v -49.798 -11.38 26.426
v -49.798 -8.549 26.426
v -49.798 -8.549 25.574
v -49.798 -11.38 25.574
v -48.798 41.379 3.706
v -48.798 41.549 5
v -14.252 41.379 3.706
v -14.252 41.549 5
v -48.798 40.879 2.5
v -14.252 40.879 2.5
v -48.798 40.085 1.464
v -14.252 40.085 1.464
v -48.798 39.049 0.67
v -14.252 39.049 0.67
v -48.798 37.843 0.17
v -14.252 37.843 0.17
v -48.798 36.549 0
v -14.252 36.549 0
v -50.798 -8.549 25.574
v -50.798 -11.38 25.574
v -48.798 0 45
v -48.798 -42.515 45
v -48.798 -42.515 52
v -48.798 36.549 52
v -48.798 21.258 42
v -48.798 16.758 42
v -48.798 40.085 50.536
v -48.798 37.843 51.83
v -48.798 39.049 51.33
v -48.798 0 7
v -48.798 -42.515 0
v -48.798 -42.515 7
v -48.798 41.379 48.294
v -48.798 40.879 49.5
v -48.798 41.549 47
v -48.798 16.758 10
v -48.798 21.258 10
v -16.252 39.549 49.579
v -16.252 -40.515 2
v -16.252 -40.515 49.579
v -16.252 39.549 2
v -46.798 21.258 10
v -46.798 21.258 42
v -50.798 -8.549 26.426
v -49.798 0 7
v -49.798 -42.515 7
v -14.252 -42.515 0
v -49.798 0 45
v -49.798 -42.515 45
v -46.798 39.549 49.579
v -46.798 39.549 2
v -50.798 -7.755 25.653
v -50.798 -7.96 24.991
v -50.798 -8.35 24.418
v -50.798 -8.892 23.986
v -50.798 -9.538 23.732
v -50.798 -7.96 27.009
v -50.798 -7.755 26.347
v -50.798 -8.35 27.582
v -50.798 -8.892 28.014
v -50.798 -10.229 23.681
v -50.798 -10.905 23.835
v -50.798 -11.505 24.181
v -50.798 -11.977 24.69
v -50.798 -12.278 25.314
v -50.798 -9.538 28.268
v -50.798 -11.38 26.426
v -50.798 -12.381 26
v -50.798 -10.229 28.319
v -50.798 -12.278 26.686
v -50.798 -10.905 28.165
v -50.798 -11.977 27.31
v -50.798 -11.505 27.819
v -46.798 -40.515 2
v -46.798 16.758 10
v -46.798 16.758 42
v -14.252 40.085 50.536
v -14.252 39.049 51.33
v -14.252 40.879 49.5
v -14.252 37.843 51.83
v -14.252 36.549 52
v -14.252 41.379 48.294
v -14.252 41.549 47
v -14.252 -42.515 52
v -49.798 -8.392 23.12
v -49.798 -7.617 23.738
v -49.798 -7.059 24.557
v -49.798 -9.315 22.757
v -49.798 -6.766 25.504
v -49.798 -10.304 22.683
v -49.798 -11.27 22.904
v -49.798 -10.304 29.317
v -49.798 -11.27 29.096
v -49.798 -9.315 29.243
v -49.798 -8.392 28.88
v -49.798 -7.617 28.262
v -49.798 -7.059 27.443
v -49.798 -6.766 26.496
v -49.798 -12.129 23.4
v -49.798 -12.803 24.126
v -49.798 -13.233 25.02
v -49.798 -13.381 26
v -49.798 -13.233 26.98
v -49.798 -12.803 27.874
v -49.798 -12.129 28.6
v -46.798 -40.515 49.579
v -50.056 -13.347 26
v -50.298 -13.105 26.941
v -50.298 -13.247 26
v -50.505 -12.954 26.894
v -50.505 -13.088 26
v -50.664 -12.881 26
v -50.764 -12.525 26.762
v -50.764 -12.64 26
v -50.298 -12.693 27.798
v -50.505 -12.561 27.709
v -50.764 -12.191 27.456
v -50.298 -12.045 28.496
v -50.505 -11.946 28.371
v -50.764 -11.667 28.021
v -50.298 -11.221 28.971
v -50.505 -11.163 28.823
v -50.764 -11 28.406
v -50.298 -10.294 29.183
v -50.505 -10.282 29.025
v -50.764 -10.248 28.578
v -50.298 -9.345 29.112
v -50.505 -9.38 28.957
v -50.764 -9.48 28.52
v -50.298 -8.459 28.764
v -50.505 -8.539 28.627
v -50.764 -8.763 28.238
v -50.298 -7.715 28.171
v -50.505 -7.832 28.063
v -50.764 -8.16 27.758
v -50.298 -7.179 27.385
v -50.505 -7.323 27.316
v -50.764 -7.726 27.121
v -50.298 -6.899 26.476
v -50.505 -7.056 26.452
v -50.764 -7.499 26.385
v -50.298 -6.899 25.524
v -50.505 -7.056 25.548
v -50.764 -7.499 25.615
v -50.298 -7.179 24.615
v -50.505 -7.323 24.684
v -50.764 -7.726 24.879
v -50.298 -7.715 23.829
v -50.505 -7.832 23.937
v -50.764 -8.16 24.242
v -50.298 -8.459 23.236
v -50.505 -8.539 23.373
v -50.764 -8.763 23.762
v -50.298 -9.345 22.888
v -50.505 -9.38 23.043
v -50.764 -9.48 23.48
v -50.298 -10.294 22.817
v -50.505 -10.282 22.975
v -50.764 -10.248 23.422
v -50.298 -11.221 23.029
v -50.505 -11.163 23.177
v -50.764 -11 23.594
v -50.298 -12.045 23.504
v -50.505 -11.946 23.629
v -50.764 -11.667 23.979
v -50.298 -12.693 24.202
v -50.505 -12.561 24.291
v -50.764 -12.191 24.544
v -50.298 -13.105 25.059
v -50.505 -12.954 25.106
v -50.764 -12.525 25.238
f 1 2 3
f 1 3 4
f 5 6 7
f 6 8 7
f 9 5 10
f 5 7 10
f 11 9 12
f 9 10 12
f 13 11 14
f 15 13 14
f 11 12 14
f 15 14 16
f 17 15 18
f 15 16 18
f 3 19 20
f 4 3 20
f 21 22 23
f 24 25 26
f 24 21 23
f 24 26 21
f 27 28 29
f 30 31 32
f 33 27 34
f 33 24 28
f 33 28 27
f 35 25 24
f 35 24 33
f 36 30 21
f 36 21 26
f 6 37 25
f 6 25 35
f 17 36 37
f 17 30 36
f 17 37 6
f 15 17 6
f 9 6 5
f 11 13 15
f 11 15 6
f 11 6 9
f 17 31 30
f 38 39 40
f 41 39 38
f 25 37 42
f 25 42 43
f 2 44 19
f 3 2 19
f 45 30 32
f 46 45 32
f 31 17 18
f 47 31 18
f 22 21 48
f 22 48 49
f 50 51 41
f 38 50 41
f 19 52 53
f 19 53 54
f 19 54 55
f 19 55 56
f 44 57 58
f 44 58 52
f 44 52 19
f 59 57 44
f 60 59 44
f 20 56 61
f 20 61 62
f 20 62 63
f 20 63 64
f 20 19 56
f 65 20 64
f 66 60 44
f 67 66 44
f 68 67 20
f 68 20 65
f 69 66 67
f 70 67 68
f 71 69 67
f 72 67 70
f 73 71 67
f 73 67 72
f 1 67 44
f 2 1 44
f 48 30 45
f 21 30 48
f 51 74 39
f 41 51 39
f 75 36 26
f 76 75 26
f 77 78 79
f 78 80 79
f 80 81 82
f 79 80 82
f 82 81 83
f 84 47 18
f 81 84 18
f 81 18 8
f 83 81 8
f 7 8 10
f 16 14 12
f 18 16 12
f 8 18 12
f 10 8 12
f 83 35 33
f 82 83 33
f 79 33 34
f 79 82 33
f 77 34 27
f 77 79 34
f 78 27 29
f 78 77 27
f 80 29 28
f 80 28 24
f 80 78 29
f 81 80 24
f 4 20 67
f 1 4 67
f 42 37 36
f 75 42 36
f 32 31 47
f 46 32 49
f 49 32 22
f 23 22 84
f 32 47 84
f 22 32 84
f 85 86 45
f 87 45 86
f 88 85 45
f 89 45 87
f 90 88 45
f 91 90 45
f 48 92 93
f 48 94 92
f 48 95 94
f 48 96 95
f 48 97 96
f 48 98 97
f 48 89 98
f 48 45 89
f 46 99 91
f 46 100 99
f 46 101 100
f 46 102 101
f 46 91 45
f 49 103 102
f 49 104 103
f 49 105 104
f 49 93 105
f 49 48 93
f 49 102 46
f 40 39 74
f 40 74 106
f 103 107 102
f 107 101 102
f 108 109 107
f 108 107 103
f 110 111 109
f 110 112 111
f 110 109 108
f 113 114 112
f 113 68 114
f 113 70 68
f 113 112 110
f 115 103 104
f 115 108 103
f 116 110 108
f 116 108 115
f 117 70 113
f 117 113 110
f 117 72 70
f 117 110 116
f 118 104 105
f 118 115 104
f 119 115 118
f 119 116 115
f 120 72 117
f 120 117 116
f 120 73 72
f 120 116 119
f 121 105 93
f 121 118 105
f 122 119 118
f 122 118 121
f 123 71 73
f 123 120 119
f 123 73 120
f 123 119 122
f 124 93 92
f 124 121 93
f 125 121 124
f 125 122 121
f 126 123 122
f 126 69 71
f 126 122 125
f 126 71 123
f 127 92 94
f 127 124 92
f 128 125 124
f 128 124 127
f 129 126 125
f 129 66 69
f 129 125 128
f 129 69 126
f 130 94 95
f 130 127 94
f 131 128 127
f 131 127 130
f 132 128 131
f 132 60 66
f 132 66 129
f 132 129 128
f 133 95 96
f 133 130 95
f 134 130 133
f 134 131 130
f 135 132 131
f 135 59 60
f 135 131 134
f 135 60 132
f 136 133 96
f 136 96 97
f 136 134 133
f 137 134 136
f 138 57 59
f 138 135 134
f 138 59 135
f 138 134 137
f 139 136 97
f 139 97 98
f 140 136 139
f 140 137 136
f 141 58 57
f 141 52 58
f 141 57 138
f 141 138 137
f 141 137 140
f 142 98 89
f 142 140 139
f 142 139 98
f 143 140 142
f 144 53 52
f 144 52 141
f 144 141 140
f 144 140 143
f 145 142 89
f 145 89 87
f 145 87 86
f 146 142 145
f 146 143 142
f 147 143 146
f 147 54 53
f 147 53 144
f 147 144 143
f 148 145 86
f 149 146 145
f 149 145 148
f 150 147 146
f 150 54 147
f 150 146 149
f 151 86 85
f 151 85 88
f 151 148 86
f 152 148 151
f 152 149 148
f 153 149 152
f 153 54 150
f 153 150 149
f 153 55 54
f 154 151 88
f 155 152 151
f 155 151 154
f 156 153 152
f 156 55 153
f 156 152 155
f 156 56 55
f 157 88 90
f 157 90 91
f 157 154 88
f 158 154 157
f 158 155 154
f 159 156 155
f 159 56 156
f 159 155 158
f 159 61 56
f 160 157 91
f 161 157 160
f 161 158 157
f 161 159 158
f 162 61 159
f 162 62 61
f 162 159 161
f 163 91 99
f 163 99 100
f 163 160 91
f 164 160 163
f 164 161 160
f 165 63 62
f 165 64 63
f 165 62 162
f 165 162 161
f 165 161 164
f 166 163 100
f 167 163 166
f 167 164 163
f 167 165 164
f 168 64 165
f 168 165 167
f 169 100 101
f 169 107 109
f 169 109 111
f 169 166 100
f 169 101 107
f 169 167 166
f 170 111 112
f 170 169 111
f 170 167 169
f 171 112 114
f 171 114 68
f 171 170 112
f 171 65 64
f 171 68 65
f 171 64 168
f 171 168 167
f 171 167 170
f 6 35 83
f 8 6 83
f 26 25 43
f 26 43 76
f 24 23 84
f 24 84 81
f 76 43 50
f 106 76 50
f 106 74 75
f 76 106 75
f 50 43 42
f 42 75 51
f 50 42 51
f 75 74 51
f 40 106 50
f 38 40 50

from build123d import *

# Parameters (mm, degrees)
F0_W      = 34.5459179953
F0_H      = 84.0644203126
F1_DEPTH  = 2
F2_W      = 2
F2_H      = 84.0644203126
F3_DEPTH  = 50
F4_W      = 2
F4_H      = 84.0644203126
F5_DEPTH  = 50
F6_W      = 84.0644203126
F6_H      = 2.4206031561
F7_DEPTH  = 32.2
F8_W      = 30.5459179953
F8_H      = 2
F9_DEPTH  = 47.6
F10_R     = 5
F11_R     = 5
F12_W     = 2
F12_H     = 47.5793968439
F13_DEPTH = 31.3
F14_W     = 4.5
F14_H     = 32
F15_DEPTH = 25
F16_W     = 42.5153374672
F16_H     = 38
F17_DEPTH = 1
F18_R     = 3.3259647968
F19_DEPTH = 1
F20_R     = 0.99999
F22_DEPTH = 1


# Not quite as in the source:
# - a fillet or chamfer is up to 0.001 mm smaller than in the source, because OpenCascade refuses the exact size


with BuildPart() as f1:
    # F0 (on Top) → F1 (new body)
    with BuildSketch(Plane.XY):
        with Locations((-31.5246856771, -0.4831273109)):
            Rectangle(F0_W, F0_H)
    extrude(amount=F1_DEPTH)

    # F2 (on face) → F3 (join)
    with BuildSketch(Plane.XY.offset(2)):
        with Locations((-15.2517266795, -0.4831273109)):
            Rectangle(F2_W, F2_H)
    extrude(amount=F3_DEPTH)

    # F4 (on face) → F5 (join)
    with BuildSketch(Plane.XY.offset(2)):
        with Locations((-47.7976446748, -0.4831273109)):
            Rectangle(F4_W, F4_H)
    extrude(amount=F5_DEPTH)

    # F6 (on face) → F7 (join)
    with BuildSketch(Plane.YZ.offset(-46.7976446748)):
        with Locations((-0.4831273109, 50.789698422)):
            Rectangle(F6_W, F6_H)
    extrude(amount=F7_DEPTH)

    # F8 (on face) → F9 (join)
    with BuildSketch(Plane.XY.offset(2)):
        with Locations((-31.5246856771, 40.5490828454)):
            Rectangle(F8_W, F8_H)
    extrude(amount=F9_DEPTH)

    # F10
    f10_edges = [f1.edges().sort_by_distance(p)[0] for p in [
        (-31.524686, 41.549083, 52),
    ]]
    fillet(f10_edges, radius=F10_R)

    # F11
    f11_edges = [f1.edges().sort_by_distance(p)[0] for p in [
        (-31.524686, 41.549083, 0),
    ]]
    fillet(f11_edges, radius=F11_R)

    # F12 (on face) → F13 (join)
    with BuildSketch(Plane(origin=(-16.2517266795, 0, 0), x_dir=(0, -1, 0), z_dir=(-1, 0, 0))):
        with Locations((41.5153374672, 25.789698422)):
            Rectangle(F12_W, F12_H)
    extrude(amount=F13_DEPTH)

    # F14 (on face) → F15 (cut)
    with BuildSketch(Plane(origin=(-48.7976446748, 0, 0), x_dir=(0, -1, 0), z_dir=(-1, 0, 0))):
        with Locations((-19.0076687336, 26)):
            Rectangle(F14_W, F14_H)
    extrude(amount=-F15_DEPTH, mode=Mode.SUBTRACT)

    # F16 (on face) → F17 (join)
    with BuildSketch(Plane(origin=(-48.7976446748, 0, 0), x_dir=(0, -1, 0), z_dir=(-1, 0, 0))):
        with Locations((21.2576687336, 26)):
            Rectangle(F16_W, F16_H)
    extrude(amount=F17_DEPTH)

    # F18 (on face) → F19 (join)
    with BuildSketch(Plane(origin=(-49.7976446748, 0, 0), x_dir=(0, -1, 0), z_dir=(-1, 0, 0))):
        with Locations((10.0552504882, 26)):
            Circle(F18_R)
    extrude(amount=F19_DEPTH)

    # F20 (radius 1 in the source; OpenCascade refuses exactly that, so slightly less here)
    f20_edges = [f1.edges().sort_by_distance(p)[0] for p in [
        (-50.797645, -6.729286, 26),
    ]]
    fillet(f20_edges, radius=F20_R)

    # F21 (on face) → F22 (cut)
    with BuildSketch(Plane(origin=(-50.7976446748, 0, 0), x_dir=(0, -1, 0), z_dir=(-1, 0, 0))):
        Polygon((11.3802812994, 26.4259647968), (10.0552504882, 26.4259647968), (8.548588492, 26.4259647968), (8.548588492, 25.5740352032), (11.3802812994, 25.5740352032), align=None)
    extrude(amount=-F22_DEPTH, mode=Mode.SUBTRACT)


solid = f1.part
